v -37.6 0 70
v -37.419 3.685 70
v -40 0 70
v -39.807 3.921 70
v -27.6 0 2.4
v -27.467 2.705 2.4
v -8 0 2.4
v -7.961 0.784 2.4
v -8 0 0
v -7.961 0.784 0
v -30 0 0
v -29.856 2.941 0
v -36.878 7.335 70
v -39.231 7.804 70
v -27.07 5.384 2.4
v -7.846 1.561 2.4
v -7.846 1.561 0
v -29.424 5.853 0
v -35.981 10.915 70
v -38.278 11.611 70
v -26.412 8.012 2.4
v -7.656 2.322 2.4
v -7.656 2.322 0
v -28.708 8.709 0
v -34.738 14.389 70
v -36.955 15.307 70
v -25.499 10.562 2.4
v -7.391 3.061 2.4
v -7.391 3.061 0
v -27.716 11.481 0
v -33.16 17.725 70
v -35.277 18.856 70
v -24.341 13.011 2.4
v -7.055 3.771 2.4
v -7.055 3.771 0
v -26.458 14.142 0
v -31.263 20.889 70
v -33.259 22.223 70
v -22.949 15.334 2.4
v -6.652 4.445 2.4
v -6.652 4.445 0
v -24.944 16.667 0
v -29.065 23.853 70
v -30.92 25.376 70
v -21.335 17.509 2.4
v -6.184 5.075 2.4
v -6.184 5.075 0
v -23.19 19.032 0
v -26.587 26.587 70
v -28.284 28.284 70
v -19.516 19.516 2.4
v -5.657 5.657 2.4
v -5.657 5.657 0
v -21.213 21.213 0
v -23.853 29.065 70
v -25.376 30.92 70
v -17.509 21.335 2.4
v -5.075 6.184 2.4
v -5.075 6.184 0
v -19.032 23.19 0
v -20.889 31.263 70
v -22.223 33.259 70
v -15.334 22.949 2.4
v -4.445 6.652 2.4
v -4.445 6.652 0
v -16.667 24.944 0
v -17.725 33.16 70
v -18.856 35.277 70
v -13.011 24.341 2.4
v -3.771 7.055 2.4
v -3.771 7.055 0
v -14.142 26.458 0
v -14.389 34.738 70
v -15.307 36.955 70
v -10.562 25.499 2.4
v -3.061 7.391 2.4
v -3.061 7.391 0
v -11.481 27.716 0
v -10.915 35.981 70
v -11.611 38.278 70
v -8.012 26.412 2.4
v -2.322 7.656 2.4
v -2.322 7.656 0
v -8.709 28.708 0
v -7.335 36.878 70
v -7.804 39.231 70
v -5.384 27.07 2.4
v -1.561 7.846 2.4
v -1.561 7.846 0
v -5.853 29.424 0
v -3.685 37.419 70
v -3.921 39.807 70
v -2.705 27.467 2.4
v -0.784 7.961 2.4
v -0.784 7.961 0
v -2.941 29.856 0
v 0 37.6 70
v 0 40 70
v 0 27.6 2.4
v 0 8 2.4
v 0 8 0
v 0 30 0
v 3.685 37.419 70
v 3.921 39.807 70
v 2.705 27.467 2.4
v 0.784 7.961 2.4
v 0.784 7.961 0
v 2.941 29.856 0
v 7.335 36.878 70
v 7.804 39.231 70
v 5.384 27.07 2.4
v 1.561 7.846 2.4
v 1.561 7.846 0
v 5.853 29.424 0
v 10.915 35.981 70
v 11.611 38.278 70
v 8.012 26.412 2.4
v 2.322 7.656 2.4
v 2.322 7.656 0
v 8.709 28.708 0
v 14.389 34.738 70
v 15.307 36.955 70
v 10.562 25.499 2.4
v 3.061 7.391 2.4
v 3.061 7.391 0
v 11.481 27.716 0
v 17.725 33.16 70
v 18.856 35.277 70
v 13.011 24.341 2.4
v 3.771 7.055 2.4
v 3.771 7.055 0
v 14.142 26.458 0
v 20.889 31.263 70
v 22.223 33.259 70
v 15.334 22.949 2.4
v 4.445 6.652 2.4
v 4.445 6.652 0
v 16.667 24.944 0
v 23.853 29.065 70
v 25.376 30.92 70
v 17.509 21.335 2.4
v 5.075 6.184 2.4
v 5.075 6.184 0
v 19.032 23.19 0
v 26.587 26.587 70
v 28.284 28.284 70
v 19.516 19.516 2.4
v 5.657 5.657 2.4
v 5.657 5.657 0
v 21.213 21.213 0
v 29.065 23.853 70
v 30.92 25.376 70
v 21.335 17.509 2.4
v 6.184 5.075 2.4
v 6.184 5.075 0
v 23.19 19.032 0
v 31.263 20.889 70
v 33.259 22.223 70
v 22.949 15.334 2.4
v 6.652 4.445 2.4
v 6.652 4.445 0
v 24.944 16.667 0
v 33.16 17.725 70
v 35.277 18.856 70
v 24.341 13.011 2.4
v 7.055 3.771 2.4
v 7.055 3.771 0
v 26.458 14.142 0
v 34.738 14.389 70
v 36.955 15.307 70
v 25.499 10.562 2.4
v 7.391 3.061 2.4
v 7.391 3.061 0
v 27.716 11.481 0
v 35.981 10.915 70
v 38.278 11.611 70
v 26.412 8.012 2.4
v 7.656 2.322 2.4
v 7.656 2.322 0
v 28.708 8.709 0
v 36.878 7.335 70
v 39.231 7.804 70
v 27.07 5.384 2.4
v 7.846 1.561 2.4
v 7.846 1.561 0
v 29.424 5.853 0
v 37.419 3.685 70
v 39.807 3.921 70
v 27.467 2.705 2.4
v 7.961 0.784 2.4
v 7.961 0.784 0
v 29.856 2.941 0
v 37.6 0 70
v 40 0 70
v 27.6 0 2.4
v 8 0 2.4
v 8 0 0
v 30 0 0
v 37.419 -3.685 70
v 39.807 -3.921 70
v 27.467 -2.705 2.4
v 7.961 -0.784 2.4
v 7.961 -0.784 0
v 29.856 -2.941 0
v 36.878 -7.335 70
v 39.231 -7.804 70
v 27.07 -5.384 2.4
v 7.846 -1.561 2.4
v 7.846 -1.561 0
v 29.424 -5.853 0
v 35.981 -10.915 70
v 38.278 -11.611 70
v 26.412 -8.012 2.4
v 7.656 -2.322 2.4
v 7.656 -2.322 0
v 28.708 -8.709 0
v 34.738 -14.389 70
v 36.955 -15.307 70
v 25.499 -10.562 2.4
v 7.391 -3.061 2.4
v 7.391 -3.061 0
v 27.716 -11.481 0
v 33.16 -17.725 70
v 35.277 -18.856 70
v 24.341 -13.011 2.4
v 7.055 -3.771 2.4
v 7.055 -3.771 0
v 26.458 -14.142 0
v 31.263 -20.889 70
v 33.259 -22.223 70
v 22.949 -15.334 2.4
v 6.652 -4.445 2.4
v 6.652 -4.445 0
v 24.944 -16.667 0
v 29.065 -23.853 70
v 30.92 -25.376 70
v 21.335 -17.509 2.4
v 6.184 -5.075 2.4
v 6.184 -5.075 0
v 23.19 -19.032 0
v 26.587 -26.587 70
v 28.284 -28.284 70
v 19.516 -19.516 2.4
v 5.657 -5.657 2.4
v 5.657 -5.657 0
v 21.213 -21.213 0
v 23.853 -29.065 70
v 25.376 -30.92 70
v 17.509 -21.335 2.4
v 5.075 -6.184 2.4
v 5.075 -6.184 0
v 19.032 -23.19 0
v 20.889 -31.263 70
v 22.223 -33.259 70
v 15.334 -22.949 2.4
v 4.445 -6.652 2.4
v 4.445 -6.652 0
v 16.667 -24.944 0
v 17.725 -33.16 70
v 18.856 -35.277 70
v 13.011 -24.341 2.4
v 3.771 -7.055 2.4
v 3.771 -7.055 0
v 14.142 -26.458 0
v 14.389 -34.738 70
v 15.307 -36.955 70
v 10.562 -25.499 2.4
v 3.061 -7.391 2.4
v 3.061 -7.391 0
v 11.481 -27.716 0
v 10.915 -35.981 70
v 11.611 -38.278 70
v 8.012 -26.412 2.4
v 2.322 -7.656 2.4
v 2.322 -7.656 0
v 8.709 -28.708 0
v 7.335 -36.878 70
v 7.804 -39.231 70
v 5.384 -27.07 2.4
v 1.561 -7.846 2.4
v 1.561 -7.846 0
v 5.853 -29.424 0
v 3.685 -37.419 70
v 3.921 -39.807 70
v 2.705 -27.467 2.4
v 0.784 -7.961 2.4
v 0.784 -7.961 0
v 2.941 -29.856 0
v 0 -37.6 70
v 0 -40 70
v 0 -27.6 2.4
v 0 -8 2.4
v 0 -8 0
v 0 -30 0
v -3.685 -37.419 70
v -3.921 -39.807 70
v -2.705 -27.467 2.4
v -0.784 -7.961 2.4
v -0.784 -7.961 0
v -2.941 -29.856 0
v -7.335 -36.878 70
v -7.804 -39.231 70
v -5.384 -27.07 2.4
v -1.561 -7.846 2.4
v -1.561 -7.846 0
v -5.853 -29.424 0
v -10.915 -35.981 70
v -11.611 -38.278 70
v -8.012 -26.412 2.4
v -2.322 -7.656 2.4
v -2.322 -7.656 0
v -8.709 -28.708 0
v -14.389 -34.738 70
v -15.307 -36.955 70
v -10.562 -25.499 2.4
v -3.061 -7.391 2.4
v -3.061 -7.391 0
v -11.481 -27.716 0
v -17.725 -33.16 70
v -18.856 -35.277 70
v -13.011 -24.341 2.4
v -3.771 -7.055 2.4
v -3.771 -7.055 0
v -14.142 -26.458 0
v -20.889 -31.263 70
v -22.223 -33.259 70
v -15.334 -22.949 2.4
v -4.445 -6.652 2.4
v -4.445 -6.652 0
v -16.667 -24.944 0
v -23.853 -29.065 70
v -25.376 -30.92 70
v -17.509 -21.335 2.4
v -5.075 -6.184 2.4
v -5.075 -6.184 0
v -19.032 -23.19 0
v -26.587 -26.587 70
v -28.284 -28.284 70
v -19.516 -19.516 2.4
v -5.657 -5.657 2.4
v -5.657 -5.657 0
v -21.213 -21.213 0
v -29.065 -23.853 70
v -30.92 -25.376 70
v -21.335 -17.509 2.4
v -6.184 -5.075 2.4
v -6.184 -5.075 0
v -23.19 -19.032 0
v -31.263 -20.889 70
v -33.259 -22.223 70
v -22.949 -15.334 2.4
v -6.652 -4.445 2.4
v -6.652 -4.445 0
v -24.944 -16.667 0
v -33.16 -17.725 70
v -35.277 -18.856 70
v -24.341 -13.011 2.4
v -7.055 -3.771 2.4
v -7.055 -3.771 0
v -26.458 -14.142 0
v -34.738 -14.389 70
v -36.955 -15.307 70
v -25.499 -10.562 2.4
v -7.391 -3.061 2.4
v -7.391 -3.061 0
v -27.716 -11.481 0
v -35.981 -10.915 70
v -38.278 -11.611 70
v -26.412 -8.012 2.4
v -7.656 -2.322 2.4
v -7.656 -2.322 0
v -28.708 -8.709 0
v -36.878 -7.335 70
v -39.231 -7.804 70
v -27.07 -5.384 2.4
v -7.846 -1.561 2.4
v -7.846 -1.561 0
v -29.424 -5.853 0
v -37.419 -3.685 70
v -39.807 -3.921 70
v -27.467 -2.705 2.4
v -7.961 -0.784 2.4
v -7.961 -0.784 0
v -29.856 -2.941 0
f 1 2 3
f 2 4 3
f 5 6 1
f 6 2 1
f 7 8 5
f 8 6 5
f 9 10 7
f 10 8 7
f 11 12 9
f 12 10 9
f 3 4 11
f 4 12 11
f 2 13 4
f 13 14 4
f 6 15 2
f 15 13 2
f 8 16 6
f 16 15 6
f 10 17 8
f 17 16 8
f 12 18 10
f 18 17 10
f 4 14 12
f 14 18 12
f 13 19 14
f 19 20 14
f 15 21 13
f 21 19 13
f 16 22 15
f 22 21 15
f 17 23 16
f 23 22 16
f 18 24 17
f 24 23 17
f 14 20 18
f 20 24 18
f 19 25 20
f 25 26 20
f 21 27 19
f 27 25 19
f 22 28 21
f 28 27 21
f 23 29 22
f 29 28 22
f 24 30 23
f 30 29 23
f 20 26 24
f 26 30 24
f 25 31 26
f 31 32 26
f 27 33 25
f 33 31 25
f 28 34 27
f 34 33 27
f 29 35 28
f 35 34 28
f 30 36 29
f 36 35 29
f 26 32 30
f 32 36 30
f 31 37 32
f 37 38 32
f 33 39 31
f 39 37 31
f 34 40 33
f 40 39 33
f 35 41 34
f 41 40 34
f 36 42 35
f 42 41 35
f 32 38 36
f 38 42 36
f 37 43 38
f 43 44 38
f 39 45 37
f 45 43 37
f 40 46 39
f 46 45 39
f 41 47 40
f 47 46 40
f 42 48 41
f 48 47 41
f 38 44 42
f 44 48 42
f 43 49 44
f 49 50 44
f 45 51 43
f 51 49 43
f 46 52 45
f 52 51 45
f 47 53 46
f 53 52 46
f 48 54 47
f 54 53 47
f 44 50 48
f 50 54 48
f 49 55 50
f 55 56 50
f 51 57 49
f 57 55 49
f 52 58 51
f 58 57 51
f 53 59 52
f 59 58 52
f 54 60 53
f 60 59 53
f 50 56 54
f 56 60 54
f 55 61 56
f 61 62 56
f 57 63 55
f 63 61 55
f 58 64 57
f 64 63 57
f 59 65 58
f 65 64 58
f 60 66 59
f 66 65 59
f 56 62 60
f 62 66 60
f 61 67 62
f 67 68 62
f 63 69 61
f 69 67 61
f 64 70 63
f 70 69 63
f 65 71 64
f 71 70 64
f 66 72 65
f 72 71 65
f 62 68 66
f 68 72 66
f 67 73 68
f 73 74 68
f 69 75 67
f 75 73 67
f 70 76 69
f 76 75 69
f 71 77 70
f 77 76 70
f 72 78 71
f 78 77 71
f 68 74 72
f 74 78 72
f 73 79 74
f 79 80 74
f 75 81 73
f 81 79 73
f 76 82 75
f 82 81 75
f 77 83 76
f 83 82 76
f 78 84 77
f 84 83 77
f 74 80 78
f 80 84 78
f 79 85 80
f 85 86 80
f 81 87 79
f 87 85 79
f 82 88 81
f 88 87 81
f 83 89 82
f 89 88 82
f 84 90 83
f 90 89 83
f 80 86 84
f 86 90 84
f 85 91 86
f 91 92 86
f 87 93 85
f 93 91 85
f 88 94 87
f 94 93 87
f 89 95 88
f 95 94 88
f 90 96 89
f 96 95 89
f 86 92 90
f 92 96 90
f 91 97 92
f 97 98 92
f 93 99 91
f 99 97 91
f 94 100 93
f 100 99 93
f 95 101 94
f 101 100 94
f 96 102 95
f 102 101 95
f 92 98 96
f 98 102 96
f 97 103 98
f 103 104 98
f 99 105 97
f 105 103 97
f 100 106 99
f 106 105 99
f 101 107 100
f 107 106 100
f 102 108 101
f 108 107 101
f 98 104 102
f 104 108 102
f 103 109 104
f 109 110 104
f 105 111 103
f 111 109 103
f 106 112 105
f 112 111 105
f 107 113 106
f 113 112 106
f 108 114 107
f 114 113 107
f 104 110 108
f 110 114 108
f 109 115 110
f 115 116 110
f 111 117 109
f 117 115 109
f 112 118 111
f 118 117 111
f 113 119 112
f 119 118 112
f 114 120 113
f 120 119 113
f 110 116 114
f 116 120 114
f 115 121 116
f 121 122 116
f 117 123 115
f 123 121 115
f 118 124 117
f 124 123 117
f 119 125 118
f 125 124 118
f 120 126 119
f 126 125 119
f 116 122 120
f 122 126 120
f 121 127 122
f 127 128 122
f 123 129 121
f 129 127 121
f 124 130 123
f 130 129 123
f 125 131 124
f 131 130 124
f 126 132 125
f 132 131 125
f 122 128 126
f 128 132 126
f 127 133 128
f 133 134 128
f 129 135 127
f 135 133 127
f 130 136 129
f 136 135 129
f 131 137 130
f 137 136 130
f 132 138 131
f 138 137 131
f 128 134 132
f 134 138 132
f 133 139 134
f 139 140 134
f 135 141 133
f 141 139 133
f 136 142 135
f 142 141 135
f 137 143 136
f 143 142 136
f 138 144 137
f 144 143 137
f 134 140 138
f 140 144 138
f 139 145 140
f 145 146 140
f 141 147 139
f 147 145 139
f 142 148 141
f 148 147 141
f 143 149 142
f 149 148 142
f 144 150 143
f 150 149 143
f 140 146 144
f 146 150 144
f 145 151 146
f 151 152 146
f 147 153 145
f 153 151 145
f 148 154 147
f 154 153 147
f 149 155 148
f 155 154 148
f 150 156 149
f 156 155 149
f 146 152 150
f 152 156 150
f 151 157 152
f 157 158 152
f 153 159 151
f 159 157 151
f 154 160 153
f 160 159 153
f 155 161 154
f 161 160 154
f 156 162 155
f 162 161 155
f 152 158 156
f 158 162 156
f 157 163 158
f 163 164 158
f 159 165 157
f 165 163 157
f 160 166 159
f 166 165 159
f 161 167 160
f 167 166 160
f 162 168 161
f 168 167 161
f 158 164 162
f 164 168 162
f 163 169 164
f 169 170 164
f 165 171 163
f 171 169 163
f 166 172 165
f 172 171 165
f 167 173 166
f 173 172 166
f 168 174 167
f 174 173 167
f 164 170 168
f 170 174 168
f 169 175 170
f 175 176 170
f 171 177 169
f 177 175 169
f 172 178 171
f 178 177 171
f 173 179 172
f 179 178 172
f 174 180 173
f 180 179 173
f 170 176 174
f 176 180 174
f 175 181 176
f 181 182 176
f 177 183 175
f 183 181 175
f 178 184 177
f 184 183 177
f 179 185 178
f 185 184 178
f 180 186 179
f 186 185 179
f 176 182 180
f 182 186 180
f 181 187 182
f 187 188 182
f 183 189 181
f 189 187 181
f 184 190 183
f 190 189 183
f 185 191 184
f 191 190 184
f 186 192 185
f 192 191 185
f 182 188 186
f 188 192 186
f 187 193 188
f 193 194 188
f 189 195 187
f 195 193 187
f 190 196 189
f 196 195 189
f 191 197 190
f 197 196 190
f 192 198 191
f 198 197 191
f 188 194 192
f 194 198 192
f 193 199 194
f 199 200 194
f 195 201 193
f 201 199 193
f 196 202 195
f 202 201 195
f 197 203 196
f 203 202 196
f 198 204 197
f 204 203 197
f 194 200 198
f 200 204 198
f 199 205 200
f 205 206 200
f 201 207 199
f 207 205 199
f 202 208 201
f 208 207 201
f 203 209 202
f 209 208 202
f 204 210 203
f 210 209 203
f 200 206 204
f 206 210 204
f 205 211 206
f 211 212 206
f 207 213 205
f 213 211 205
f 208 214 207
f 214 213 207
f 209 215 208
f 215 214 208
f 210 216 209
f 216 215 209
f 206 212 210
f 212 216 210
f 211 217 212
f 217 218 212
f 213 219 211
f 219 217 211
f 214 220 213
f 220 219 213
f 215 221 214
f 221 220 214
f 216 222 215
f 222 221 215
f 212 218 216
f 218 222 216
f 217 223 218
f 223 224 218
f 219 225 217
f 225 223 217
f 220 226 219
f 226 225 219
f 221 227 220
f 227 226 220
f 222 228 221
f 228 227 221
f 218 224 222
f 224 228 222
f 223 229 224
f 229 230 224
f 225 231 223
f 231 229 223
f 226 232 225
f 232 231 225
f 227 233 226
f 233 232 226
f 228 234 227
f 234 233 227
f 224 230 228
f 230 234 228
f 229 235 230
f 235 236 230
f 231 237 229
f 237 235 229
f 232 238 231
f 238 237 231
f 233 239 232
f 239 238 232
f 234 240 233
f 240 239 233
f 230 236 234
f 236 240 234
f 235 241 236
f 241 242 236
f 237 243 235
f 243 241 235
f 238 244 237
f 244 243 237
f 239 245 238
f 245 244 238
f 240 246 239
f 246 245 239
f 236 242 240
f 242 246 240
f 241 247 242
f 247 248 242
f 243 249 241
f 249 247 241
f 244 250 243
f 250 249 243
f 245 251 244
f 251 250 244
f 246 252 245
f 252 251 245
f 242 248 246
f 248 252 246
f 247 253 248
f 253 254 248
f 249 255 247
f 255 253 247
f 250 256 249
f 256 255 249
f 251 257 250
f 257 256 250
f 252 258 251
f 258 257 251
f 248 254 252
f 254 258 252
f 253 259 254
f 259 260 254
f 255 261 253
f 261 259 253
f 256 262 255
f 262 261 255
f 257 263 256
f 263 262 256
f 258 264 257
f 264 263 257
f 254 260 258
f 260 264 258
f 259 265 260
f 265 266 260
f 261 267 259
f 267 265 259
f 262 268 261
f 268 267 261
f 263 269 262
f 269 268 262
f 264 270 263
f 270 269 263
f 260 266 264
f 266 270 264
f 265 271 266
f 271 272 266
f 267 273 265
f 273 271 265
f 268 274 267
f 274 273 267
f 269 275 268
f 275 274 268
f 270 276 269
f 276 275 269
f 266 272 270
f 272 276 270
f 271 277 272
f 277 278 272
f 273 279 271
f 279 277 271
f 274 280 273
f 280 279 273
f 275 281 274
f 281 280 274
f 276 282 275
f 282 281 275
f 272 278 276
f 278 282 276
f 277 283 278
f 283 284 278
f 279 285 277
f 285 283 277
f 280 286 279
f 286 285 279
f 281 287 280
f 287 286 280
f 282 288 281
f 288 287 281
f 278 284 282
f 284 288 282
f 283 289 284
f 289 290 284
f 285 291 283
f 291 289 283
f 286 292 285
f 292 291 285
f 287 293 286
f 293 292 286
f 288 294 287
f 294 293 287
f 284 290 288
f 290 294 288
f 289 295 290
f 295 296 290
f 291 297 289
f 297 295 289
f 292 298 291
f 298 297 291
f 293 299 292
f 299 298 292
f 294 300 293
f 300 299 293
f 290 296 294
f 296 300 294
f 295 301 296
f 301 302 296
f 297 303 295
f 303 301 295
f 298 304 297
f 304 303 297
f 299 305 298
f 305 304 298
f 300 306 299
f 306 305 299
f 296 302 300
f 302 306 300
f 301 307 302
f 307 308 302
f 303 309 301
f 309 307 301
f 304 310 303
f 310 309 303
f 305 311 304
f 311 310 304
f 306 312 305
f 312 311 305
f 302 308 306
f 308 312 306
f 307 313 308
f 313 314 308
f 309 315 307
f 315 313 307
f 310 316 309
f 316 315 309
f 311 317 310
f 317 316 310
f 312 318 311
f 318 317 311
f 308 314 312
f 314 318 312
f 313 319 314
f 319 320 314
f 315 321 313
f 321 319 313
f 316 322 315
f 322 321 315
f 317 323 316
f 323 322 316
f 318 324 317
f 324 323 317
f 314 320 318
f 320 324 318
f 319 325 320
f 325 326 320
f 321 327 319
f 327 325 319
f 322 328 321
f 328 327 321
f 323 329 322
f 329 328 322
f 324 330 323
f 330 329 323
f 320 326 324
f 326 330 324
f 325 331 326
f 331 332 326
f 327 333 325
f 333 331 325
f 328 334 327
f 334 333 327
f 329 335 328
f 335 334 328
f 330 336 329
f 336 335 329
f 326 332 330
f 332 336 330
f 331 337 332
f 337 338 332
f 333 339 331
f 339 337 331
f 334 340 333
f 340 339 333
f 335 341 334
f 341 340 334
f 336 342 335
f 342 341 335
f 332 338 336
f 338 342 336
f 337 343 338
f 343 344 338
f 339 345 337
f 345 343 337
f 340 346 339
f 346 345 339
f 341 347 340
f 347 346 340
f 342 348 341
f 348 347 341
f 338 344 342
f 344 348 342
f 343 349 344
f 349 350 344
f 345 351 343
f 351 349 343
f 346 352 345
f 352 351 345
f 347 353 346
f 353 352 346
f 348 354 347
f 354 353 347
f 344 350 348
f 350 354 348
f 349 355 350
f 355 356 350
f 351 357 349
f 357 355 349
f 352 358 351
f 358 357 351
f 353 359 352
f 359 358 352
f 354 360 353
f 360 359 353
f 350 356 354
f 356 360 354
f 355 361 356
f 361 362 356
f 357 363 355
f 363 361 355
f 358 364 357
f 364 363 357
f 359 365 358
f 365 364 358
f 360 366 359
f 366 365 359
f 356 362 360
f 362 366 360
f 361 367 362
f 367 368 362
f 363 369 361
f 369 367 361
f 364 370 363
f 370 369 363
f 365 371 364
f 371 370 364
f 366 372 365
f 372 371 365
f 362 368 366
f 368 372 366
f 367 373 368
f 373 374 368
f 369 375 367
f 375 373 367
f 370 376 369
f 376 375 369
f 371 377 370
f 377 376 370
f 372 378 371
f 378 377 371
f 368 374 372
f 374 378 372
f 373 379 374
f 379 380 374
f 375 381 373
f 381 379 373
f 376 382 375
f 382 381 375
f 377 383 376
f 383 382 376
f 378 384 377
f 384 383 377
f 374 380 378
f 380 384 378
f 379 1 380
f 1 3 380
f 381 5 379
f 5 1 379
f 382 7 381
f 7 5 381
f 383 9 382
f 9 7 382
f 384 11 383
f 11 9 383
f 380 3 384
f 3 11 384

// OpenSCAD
// plant-pot.scad — a tapered plant pot with a drainage
// hole, made by spinning a 2D profile around the z axis.
// rotate_extrude() takes a flat shape drawn to the RIGHT
// of the axis (x >= 0) and sweeps it through 360 degrees.

/* [Pot dimensions] */
// Radius at the top rim
top_r = 40;          // [25:80]
// Radius at the base
bottom_r = 30;       // [20:60]
// Overall height
pot_height = 70;     // [40:120]
// Wall and floor thickness
wall = 2.4;          // [1.6:0.4:4]

/* [Hidden] */
$fn = 64;

// The profile is the pot's cross-section: one closed
// polygon that walks along the floor, up the outside,
// over the rim, back down the inside, and across the
// floor's top face. One polygon with a real thickness,
// so the pot is a single watertight solid. The profile
// starts and ends at r = 8 rather than r = 0 — the gap
// in the middle of the floor is the drainage hole.
rotate_extrude()
    polygon(points = [
        [8,            0],          // floor underside, inner edge
        [bottom_r,     0],          // floor underside, outer edge
        [top_r,        pot_height], // outside wall, up to the rim
        [top_r - wall, pot_height], // over the rim
        [bottom_r - wall, wall],    // inside wall, down to the floor
        [8,            wall]        // floor top face, back to the hole
    ]);
